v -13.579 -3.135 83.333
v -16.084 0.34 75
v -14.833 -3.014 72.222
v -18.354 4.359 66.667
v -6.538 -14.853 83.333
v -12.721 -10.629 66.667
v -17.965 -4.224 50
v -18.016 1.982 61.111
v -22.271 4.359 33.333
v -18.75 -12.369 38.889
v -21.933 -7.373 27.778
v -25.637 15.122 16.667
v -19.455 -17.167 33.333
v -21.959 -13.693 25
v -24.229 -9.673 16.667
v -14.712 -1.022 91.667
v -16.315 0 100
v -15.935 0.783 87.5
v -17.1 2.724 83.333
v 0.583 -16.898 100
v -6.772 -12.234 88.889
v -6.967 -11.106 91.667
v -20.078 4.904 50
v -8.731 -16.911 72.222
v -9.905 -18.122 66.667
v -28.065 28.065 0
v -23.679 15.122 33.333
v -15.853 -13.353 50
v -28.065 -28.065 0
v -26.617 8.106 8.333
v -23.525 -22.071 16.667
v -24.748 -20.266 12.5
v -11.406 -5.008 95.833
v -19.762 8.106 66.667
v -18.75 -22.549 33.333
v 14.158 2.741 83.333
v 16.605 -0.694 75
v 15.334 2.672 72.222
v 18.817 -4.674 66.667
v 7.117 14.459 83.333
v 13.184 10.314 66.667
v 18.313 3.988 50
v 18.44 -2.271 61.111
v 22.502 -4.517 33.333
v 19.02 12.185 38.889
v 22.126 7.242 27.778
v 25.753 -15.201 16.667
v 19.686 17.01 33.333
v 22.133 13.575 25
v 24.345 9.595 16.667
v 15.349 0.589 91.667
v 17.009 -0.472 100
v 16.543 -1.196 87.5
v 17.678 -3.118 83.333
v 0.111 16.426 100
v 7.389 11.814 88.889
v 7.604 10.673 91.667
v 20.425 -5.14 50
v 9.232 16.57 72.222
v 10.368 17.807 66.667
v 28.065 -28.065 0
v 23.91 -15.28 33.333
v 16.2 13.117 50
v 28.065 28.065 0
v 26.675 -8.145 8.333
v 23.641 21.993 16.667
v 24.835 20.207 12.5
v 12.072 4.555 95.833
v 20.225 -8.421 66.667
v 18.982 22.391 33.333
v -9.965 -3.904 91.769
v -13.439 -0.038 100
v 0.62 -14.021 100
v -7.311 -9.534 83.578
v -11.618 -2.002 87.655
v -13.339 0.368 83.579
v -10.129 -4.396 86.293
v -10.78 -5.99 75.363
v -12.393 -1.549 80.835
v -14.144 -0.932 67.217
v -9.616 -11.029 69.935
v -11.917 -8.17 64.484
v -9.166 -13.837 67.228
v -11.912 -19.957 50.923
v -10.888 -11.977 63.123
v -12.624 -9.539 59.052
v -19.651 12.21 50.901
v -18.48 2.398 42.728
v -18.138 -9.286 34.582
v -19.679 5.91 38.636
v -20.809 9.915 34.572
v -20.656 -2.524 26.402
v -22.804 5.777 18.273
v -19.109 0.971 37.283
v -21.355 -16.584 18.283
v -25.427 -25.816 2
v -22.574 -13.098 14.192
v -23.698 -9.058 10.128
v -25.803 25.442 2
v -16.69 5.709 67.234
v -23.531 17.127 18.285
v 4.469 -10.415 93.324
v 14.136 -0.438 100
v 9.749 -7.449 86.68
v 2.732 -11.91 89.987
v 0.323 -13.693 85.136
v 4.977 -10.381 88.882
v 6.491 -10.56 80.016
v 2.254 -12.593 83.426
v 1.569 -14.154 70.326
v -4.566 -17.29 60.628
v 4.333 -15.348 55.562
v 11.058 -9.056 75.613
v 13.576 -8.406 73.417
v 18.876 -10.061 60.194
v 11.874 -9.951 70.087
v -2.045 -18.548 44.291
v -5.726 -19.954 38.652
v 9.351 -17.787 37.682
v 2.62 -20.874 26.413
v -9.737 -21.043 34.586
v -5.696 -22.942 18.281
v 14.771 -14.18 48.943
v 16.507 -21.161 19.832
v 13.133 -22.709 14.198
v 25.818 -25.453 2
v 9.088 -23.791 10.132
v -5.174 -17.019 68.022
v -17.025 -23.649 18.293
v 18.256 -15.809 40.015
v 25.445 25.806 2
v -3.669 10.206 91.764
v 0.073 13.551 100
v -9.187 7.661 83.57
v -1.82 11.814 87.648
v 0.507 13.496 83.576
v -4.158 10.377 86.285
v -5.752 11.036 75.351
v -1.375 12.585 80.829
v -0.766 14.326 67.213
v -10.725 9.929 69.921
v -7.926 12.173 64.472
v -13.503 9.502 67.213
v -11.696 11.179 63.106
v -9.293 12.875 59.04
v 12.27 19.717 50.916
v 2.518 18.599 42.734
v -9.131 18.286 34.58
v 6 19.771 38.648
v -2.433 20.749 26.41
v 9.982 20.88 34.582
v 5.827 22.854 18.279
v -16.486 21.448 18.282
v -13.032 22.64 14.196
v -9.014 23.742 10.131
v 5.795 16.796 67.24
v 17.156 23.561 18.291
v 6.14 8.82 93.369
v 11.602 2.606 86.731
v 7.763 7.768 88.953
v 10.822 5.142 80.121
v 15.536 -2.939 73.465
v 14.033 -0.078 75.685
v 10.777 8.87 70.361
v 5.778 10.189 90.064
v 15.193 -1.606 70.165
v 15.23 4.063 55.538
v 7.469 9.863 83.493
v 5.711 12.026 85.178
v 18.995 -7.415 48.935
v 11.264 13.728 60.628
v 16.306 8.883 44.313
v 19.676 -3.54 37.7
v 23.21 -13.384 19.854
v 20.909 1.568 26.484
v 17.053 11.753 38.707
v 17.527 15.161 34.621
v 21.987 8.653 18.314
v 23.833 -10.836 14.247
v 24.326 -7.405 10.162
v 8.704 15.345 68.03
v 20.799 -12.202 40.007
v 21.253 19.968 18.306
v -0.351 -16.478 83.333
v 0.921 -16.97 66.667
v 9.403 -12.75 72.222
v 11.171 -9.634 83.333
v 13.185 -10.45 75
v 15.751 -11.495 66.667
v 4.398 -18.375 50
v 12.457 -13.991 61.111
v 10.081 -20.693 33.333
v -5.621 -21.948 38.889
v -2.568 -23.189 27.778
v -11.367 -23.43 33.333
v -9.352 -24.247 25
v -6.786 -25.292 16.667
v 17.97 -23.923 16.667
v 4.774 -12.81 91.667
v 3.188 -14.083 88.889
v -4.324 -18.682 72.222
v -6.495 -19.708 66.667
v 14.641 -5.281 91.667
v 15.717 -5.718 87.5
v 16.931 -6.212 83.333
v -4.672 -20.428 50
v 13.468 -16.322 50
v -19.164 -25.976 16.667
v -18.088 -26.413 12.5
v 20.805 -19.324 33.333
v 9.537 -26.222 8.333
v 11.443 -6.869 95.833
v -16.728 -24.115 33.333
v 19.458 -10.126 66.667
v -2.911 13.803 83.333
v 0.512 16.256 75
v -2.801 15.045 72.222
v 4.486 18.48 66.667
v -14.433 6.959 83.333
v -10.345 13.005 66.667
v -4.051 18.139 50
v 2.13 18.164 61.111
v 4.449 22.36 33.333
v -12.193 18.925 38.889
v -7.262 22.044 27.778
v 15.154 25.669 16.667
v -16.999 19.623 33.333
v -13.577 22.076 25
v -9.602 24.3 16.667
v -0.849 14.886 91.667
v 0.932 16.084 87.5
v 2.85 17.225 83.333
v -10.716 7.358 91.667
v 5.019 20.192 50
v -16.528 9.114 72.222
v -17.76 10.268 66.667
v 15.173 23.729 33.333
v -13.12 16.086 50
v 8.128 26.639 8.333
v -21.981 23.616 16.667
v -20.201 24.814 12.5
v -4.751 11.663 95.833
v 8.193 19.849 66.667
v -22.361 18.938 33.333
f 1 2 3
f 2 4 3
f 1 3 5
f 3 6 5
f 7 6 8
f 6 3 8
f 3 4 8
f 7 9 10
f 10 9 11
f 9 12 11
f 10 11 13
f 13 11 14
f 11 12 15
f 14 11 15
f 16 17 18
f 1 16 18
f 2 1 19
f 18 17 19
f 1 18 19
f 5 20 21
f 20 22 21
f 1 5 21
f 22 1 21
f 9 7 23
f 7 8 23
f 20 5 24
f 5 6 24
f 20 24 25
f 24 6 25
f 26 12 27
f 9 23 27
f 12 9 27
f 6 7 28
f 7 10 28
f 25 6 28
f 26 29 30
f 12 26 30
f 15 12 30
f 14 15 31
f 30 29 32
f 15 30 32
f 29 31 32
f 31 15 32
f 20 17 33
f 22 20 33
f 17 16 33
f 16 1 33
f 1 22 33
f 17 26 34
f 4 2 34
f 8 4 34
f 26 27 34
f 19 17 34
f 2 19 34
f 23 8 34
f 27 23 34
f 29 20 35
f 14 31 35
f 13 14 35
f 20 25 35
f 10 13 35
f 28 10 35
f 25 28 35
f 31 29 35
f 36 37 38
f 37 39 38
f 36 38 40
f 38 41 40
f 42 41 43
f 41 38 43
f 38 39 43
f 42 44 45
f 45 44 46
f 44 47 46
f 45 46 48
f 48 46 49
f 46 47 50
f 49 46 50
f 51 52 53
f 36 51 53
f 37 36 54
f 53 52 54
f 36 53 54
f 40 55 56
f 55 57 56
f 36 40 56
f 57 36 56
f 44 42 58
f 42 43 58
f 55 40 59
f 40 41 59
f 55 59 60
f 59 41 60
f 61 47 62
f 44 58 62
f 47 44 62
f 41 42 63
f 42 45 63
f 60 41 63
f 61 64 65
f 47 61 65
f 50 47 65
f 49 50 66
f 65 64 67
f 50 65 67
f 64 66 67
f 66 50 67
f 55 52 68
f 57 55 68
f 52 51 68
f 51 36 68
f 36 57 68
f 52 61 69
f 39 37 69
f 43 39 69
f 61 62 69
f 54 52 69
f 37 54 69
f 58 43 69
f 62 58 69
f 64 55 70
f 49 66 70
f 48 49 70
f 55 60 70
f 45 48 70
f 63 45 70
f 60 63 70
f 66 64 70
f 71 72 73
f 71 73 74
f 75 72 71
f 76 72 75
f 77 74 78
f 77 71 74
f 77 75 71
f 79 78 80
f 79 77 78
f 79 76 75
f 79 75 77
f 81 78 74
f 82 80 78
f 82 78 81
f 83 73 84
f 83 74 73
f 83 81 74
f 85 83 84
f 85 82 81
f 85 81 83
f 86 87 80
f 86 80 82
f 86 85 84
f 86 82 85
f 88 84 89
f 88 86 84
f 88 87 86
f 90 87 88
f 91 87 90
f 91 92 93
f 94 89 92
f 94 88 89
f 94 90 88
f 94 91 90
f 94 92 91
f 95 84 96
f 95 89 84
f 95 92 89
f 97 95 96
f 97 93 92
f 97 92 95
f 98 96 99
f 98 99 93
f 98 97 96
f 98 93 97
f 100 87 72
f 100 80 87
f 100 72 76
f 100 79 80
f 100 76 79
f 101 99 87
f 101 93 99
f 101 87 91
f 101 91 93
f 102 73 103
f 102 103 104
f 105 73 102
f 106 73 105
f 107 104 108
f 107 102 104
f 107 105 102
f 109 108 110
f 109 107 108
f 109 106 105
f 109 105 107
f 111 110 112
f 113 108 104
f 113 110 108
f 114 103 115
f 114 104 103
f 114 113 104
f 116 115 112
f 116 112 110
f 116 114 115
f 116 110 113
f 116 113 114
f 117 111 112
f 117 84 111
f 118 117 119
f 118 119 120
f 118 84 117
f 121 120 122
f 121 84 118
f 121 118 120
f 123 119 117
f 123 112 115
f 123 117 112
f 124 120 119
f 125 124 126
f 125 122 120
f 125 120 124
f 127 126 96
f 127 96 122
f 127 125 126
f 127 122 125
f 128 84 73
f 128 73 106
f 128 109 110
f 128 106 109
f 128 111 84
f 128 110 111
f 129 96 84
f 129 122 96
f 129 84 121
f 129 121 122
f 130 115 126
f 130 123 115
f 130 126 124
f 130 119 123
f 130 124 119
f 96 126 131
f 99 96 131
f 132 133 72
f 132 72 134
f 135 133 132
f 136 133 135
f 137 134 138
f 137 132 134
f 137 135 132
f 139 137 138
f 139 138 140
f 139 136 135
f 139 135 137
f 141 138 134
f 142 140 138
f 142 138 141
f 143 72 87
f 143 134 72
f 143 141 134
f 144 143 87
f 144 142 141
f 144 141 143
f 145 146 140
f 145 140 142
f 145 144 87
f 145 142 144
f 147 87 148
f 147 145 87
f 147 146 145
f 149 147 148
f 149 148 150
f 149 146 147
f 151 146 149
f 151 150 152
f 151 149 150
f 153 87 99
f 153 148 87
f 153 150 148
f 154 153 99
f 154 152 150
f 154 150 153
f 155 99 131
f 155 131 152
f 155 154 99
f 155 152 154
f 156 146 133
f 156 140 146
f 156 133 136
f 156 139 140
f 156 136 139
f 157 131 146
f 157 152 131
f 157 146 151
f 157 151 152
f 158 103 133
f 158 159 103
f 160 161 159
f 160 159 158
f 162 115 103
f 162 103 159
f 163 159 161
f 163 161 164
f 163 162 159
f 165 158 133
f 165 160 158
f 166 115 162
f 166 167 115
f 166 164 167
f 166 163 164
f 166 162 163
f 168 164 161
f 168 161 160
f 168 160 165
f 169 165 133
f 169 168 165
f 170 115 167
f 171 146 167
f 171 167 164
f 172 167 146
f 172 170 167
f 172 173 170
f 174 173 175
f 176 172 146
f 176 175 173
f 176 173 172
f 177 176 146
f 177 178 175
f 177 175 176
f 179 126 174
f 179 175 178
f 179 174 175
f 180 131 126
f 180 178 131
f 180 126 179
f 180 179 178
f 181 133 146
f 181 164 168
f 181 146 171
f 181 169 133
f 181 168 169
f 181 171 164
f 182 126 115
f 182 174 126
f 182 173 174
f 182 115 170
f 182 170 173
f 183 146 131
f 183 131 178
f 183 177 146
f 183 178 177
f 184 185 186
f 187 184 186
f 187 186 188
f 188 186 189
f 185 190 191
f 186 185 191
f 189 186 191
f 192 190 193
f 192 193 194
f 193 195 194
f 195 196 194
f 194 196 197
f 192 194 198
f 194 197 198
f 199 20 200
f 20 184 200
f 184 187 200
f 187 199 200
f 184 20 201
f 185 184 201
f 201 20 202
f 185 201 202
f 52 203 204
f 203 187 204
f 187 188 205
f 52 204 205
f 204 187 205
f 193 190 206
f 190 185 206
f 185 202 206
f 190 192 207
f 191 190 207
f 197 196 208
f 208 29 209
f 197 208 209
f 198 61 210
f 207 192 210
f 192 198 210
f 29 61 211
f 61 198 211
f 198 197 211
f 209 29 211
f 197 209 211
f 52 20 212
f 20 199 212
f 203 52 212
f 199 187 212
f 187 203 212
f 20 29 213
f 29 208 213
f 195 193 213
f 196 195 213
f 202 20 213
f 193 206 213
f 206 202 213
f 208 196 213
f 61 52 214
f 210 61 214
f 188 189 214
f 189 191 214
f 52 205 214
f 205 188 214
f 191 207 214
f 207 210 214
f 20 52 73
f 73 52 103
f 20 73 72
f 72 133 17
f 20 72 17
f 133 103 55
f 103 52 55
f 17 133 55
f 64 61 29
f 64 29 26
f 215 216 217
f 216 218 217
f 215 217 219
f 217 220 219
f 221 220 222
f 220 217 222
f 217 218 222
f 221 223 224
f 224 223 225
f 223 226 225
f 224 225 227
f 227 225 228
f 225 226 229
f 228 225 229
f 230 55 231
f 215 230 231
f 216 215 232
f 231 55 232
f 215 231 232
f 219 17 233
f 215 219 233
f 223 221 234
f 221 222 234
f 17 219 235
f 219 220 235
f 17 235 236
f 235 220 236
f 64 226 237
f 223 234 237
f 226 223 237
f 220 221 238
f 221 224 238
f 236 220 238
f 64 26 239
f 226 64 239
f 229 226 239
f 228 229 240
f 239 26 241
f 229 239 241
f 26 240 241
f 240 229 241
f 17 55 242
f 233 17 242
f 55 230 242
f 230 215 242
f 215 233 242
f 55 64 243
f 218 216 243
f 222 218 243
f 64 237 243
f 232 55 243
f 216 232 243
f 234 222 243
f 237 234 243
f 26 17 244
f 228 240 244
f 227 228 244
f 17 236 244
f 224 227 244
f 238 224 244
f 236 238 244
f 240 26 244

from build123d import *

# Parameters (mm, degrees)
F0_W = 56.13058
F0_H = 56.130584
F4_T = -2


with BuildPart() as f3:
    # F2 (on offset) → F3 section 0
    with BuildSketch(Plane.XY.offset(100)):
        Polygon((17.008768, -0.472353), (0.110915, 16.4255), (-16.314585, 0), (0.583268, -16.897853), align=None)
    # F0 (on Top) → F3 section 1
    with BuildSketch(Plane.XY):
        Rectangle(F0_W, F0_H)
    loft()

    # F4
    f4_openings = [f3.faces().sort_by_distance(p)[0] for p in [
        (0.347092, -0.236176, 100),
    ]]
    offset(amount=F4_T, openings=f4_openings)


solid = f3.part
